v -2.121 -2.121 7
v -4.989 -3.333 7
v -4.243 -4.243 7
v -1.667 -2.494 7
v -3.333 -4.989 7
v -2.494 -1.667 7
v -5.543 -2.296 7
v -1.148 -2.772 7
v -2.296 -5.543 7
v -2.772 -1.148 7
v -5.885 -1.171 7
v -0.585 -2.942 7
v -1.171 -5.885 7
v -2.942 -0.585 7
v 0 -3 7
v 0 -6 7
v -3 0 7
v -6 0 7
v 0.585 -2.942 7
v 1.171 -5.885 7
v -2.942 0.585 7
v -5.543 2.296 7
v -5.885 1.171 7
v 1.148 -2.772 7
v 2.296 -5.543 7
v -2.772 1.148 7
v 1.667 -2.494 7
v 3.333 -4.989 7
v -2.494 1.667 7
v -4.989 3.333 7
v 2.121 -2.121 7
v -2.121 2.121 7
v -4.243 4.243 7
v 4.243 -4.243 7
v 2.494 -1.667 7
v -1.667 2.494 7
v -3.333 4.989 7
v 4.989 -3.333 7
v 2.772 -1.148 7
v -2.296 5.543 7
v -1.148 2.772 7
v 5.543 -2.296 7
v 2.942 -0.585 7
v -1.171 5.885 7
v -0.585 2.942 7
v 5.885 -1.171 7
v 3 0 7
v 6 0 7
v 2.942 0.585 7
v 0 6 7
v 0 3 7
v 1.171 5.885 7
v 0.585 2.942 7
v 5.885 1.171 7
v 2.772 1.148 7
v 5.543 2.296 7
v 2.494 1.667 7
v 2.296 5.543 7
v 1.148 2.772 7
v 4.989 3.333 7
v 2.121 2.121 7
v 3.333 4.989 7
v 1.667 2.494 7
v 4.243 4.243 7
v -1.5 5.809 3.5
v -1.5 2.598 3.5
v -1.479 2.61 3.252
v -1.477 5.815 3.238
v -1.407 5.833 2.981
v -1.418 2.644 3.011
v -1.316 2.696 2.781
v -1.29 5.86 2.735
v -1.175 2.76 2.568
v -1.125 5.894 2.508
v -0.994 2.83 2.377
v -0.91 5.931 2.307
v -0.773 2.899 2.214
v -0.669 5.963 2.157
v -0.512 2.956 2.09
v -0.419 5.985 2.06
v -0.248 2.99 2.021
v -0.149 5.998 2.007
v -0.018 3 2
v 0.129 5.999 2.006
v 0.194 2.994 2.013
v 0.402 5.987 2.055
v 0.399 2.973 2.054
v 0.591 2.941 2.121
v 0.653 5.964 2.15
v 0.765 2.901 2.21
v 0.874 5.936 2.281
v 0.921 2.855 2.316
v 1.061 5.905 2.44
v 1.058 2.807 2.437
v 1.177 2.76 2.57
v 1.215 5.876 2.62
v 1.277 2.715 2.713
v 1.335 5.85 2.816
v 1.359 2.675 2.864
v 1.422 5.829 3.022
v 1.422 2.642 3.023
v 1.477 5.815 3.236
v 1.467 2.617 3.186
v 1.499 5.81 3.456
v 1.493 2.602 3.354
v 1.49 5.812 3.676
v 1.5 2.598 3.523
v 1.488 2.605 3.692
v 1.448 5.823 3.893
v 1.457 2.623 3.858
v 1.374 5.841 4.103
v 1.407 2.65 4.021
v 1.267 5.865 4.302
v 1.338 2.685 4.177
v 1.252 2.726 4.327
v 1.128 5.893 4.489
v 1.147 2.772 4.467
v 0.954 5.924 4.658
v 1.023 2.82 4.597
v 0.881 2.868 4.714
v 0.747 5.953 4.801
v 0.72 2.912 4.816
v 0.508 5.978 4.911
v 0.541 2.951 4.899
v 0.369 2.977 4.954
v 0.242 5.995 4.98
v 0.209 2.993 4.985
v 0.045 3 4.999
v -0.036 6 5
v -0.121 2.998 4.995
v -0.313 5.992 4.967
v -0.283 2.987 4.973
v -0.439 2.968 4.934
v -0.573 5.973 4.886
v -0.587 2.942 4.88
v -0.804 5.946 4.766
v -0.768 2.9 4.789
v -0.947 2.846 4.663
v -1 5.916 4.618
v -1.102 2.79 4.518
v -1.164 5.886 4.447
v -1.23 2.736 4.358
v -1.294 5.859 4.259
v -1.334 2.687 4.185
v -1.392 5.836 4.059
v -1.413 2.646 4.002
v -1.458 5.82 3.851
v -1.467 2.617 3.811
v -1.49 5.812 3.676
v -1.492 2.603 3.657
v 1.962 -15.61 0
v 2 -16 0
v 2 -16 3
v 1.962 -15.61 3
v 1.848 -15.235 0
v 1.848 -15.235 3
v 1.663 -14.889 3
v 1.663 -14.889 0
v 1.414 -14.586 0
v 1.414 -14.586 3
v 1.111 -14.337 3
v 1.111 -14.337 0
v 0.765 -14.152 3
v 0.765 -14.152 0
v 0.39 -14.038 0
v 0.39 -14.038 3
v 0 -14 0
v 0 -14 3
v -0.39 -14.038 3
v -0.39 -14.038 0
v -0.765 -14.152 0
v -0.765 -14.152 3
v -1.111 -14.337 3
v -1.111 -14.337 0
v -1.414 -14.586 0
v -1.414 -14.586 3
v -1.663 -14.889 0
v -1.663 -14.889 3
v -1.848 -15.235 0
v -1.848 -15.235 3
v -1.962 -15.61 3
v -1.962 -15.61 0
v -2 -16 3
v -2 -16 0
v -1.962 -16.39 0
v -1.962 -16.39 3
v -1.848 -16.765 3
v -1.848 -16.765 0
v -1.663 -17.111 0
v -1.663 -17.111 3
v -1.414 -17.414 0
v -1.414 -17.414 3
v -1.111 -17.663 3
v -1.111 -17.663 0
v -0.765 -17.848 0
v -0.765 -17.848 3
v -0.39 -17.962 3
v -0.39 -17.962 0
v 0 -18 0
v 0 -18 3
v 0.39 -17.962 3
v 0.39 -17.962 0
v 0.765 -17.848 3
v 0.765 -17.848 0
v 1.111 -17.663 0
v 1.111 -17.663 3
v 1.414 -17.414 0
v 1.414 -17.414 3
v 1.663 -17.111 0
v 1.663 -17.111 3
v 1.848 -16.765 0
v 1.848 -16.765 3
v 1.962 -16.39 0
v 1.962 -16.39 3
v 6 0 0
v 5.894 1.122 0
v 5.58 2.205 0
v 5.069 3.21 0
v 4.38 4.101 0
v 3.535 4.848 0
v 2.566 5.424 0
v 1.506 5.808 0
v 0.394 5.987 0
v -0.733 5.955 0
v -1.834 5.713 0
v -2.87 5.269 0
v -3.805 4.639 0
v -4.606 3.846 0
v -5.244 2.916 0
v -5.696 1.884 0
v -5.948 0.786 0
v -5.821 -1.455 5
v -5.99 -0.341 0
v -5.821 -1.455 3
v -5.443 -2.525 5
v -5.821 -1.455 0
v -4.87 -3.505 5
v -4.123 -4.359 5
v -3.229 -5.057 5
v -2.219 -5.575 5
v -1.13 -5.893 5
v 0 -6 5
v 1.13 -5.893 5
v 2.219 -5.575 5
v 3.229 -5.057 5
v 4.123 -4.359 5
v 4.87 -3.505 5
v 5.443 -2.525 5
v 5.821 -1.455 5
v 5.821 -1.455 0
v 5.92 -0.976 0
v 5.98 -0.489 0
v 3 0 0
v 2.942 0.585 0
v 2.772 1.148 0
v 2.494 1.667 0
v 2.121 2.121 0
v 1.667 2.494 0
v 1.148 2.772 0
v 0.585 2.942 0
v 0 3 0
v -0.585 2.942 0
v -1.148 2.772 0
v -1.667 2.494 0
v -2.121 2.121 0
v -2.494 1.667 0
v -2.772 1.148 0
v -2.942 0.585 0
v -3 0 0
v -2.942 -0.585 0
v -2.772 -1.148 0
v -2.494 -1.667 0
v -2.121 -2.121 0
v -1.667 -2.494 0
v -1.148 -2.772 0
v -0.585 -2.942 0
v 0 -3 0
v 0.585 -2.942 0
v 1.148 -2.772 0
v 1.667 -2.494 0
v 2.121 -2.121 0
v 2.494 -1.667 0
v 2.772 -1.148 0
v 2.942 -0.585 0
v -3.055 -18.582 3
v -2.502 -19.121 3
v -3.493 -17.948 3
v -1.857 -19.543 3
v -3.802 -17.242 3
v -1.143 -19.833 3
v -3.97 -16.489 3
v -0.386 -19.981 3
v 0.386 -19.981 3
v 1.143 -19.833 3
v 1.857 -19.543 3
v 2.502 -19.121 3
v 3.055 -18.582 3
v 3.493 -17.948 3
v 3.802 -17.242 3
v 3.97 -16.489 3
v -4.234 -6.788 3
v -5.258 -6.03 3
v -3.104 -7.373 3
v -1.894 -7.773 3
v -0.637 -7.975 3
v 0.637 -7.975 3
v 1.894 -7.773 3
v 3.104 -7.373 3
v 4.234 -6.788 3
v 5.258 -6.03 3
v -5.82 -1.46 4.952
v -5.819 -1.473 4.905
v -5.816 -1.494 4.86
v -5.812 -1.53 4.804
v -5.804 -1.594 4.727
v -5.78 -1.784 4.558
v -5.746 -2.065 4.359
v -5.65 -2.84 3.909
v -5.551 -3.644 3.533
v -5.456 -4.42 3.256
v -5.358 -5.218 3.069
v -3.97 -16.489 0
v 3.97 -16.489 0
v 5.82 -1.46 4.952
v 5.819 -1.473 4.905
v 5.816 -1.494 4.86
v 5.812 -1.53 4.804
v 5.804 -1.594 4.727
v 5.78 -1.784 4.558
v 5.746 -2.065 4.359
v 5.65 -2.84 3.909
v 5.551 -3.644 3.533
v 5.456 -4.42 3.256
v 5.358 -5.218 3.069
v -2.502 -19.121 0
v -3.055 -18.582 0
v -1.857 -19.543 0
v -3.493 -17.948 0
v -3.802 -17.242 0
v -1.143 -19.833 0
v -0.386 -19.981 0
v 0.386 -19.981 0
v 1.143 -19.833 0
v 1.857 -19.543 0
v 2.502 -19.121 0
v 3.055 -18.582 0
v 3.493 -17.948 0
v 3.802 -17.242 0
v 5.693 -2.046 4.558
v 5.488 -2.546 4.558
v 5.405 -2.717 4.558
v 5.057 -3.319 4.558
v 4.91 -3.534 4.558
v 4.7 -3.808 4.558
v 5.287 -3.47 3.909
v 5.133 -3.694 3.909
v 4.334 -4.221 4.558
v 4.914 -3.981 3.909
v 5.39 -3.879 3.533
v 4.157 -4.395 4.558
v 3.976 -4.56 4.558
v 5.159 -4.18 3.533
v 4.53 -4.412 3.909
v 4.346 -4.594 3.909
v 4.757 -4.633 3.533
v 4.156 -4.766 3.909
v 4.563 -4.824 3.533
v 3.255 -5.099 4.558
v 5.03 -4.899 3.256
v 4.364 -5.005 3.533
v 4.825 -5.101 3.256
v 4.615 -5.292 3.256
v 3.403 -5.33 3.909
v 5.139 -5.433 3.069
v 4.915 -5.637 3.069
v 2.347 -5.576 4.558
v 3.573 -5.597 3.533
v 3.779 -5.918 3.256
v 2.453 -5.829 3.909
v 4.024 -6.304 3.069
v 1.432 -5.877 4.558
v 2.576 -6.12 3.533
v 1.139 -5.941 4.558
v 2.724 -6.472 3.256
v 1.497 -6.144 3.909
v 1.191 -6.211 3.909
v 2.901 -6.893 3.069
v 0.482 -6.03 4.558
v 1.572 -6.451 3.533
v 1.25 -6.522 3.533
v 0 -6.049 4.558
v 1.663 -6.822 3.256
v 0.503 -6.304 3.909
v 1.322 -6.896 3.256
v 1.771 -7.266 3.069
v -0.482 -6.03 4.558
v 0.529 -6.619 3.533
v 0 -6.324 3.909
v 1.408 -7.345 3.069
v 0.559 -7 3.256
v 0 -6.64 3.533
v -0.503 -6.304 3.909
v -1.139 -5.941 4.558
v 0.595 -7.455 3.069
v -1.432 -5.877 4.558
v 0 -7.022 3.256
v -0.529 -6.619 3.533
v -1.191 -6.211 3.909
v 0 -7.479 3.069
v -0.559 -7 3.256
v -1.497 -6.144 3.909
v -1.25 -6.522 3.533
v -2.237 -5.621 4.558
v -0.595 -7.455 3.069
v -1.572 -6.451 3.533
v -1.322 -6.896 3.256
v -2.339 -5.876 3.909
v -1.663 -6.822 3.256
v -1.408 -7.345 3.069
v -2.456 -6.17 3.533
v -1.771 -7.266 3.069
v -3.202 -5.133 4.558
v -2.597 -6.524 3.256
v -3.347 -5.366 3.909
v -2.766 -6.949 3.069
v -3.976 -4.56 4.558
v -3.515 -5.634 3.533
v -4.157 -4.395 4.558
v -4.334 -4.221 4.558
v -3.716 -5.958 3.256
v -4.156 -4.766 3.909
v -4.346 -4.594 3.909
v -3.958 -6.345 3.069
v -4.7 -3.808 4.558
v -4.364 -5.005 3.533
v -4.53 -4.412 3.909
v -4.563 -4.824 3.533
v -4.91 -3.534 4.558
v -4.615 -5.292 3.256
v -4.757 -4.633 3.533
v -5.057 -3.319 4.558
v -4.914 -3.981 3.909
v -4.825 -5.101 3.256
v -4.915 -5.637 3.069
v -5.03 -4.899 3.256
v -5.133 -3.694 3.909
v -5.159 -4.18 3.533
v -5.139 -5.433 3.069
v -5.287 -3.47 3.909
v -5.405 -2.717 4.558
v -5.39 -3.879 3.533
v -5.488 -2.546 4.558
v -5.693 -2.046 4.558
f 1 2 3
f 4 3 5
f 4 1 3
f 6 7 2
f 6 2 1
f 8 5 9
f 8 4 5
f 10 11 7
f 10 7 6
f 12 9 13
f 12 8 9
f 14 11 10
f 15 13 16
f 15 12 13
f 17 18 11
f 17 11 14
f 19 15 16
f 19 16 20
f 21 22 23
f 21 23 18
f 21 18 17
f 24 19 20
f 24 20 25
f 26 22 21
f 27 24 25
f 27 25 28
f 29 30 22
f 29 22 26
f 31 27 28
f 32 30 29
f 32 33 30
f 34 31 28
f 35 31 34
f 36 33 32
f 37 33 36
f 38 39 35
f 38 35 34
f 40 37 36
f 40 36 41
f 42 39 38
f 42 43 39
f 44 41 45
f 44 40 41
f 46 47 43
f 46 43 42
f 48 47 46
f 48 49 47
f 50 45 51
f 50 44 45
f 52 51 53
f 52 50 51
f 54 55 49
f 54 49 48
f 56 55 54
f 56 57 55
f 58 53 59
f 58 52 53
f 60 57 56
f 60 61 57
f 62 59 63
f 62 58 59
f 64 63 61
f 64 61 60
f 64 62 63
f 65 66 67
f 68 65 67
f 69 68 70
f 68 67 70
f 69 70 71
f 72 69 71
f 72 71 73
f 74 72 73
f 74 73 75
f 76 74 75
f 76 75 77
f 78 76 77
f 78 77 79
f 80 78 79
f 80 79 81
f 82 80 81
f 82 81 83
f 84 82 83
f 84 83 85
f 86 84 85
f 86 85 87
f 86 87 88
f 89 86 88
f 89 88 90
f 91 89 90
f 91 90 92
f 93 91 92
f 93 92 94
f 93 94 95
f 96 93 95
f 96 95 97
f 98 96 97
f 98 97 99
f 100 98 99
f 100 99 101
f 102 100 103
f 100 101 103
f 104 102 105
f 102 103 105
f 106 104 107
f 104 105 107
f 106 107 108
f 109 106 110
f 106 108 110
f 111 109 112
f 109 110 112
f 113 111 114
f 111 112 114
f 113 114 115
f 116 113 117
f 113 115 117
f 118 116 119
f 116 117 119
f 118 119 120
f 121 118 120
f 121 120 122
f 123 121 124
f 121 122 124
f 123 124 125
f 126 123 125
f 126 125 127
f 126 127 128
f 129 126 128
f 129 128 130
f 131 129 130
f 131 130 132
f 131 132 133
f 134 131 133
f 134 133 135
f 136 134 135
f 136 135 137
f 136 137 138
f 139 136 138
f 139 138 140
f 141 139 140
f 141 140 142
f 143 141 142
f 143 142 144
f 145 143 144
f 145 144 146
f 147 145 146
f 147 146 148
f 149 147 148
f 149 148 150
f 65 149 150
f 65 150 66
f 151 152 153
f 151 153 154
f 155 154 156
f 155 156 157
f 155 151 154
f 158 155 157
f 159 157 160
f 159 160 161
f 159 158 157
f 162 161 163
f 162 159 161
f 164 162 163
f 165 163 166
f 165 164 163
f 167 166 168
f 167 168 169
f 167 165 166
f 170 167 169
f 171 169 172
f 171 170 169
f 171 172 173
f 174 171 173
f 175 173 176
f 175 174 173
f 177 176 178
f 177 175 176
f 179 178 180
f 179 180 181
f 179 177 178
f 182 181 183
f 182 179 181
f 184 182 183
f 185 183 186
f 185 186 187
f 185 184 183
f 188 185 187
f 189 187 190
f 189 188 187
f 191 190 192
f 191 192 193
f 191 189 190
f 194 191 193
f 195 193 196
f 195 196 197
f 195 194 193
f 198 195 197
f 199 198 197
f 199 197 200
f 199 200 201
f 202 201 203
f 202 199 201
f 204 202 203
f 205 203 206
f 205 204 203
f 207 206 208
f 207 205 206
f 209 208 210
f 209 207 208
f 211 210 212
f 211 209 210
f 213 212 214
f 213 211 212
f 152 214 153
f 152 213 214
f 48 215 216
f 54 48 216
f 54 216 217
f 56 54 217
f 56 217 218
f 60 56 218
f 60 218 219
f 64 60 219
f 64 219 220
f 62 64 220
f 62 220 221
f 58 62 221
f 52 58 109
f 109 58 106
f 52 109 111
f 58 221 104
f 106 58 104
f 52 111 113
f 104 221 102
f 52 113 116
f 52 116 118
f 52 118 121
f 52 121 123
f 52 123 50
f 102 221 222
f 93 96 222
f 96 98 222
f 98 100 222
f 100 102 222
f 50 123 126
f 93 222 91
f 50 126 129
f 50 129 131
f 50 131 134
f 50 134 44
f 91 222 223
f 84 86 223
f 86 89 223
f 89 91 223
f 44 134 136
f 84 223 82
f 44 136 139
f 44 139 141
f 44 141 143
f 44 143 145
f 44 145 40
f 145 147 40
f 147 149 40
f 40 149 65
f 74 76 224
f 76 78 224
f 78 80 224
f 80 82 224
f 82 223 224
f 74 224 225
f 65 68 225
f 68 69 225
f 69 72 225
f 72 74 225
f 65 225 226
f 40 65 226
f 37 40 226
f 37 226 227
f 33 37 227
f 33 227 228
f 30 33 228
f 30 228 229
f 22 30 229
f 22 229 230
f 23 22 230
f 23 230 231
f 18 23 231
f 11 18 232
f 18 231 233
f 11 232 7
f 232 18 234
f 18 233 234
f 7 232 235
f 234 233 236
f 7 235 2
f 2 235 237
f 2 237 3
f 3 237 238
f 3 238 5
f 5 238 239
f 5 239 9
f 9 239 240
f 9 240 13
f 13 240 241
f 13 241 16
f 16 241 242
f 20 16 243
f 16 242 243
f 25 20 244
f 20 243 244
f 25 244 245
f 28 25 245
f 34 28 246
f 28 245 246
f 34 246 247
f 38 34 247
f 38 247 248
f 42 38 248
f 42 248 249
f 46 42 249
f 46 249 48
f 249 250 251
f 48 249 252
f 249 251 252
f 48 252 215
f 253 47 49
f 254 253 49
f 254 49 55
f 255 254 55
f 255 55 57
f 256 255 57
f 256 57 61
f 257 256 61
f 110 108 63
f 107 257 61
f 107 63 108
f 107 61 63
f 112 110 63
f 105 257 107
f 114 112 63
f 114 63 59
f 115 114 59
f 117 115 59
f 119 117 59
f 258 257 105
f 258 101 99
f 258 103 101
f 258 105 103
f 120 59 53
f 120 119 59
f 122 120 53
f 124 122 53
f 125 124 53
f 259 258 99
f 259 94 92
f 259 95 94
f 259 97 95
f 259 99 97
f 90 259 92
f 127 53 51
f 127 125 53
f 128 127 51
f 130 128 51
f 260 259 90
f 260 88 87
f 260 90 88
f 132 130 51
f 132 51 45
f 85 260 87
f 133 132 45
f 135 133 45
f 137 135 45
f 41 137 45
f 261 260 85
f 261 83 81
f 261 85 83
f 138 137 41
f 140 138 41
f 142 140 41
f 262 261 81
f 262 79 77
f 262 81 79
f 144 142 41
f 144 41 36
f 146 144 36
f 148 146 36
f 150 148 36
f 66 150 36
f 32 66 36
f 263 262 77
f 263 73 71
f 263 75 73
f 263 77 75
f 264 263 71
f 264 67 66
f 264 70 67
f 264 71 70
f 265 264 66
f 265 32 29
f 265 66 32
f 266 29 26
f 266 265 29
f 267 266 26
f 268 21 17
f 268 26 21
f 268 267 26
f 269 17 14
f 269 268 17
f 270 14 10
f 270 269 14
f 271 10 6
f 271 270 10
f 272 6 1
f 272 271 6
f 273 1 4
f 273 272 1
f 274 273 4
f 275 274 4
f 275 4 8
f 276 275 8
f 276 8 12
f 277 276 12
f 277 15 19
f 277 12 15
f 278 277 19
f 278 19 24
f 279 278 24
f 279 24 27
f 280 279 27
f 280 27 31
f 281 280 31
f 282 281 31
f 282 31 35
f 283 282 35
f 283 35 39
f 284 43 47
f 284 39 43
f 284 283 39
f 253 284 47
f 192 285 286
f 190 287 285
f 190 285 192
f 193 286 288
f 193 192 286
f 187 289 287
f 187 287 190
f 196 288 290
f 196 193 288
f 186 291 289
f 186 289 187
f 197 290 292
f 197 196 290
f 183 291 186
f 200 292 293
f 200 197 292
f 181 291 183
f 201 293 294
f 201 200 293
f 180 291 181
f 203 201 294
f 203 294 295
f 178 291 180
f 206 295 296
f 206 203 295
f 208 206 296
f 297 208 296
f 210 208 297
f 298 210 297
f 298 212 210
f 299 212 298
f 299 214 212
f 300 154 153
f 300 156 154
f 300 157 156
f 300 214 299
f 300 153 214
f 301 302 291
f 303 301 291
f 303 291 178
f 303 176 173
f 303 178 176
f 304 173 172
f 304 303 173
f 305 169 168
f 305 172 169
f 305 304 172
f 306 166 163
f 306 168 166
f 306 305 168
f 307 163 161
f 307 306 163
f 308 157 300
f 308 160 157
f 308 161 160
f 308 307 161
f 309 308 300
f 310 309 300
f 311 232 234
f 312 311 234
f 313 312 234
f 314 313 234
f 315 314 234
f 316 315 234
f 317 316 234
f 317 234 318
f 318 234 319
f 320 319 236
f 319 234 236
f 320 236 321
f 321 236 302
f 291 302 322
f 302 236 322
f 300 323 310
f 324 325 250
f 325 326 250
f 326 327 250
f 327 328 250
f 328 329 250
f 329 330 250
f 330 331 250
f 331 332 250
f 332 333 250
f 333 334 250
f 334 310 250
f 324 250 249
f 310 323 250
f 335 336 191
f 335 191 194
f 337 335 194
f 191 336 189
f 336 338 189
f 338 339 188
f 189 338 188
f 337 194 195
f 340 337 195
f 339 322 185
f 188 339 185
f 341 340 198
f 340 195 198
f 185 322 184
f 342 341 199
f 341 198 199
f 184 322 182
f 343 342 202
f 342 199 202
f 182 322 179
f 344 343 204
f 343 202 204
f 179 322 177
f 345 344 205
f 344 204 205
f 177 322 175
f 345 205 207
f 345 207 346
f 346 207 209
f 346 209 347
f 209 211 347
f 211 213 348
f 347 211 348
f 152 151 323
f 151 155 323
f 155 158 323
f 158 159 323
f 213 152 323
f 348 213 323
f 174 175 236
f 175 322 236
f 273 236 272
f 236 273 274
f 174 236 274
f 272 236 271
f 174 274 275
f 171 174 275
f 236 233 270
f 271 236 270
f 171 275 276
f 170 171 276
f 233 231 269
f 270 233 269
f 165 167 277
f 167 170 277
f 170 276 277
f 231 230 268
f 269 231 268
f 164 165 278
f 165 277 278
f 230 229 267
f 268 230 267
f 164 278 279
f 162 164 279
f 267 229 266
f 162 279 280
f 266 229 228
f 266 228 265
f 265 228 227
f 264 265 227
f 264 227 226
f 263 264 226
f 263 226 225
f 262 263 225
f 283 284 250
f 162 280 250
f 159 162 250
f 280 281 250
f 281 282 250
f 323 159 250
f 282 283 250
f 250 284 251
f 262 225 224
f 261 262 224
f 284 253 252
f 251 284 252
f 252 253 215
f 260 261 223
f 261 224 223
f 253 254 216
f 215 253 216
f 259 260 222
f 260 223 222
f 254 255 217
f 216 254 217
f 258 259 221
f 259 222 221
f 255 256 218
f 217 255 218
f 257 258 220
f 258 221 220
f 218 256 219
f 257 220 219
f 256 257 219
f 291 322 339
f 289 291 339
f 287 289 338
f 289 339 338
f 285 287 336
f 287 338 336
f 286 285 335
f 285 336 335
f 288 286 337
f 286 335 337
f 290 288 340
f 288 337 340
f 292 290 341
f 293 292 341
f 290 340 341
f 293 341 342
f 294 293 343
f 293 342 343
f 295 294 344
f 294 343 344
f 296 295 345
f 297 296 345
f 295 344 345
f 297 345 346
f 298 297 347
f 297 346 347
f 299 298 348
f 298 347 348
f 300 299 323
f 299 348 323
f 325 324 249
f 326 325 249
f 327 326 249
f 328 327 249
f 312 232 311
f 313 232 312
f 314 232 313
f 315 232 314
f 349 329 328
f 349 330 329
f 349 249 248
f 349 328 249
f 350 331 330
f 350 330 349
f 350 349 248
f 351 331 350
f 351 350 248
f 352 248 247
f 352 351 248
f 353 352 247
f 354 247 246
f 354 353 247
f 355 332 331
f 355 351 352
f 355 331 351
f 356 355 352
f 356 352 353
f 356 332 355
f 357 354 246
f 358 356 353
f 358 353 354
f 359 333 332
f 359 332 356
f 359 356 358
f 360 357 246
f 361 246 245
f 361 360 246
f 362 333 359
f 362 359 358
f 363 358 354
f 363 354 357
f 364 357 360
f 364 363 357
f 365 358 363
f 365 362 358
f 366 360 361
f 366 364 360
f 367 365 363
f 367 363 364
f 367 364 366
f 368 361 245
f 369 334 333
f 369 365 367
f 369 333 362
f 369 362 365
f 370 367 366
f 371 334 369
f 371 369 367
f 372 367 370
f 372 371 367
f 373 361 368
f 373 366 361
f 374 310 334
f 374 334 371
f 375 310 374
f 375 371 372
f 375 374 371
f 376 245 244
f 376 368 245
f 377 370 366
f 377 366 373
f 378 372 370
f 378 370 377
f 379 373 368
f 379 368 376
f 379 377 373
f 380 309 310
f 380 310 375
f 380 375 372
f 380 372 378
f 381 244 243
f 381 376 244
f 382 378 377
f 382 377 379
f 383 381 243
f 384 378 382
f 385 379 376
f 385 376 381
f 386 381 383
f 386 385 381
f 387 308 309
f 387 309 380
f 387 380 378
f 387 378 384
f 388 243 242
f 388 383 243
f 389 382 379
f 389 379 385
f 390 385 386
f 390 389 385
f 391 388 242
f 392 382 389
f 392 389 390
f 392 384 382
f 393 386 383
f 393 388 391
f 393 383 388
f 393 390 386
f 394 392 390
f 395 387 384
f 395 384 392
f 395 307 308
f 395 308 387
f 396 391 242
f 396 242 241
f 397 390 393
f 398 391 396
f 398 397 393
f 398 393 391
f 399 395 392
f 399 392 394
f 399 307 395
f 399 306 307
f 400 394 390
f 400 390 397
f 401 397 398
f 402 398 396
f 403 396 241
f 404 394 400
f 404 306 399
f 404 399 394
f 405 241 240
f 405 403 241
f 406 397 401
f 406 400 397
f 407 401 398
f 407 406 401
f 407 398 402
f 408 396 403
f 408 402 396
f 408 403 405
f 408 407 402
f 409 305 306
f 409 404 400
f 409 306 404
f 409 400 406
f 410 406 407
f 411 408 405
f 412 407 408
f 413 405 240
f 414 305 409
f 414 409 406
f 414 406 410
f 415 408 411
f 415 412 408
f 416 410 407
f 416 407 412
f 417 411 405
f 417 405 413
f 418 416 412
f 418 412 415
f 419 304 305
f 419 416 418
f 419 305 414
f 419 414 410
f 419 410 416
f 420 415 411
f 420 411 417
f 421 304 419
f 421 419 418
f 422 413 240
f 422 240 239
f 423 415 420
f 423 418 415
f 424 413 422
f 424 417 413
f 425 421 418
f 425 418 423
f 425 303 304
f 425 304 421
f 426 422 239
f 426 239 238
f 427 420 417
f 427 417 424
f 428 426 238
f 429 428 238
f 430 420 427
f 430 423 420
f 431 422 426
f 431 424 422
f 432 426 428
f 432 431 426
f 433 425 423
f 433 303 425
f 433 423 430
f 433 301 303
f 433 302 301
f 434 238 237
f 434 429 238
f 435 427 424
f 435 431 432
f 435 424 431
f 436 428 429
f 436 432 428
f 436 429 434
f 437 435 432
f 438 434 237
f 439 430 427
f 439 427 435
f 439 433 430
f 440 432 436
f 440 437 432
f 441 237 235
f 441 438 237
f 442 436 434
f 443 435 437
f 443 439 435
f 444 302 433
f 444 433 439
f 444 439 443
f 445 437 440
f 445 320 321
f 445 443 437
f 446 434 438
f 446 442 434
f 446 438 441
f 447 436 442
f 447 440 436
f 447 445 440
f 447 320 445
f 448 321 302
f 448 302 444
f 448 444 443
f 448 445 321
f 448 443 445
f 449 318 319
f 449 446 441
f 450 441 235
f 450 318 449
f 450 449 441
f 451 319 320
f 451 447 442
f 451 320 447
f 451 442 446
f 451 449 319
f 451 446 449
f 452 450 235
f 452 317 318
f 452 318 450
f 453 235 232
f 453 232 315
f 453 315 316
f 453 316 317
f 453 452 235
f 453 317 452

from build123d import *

# Parameters (mm, degrees)
SKETCH1_R             = 6
BOSS_EXTRUDE2_DEPTH   = 7
SKETCH1_4_R           = 2
BOSS_EXTRUDE3_DEPTH   = 3
SKETCH1_5_R           = 3
CUT_EXTRUDE1_DEPTH    = 8
FILLET5_R             = 2
M3_TAPPED_HOLE2_D     = 3
M3_TAPPED_HOLE2_DEPTH = 8.5
M3_TAPPED_HOLE2_TIP   = 0.901290929


with BuildPart() as part:
    # Sketch1 → Boss-Extrude2 (new body)
    with BuildSketch(Plane.XY):
        Circle(SKETCH1_R)
    extrude(amount=BOSS_EXTRUDE2_DEPTH)

    # Sketch1<4> → Boss-Extrude3 (add)
    with BuildSketch(Plane.XY):
        with BuildLine():
            Line((3.970026899, -16.488760087), (5.820835183, -1.45529302))
            ThreePointArc((5.820835183, -1.45529302), (0, -6), (-5.820835183, -1.45529302))
            Line((-5.820835183, -1.45529302), (-3.970026899, -16.488760087))
            ThreePointArc((-3.970026899, -16.488760087), (0, -20), (3.970026899, -16.488760087))
        make_face()
        with Locations((0, -16)):
            Circle(SKETCH1_4_R, mode=Mode.SUBTRACT)
    extrude(amount=BOSS_EXTRUDE3_DEPTH)

    # Sketch1<5> → Cut-Extrude1 (cut, through all)
    with BuildSketch(Plane.XY):
        Circle(SKETCH1_5_R)
    extrude(amount=CUT_EXTRUDE1_DEPTH, mode=Mode.SUBTRACT)

    # Fillet5
    fillet5_edges = [part.edges().sort_by_distance(p)[0] for p in [
        (0, -6, 3),
    ]]
    fillet(fillet5_edges, radius=FILLET5_R)

    # M3 Tapped Hole2
    with Locations(Plane(origin=(0, 7, 0), x_dir=(1, 0, 0), z_dir=(0, 1, 0))):
        with Locations((0, -3.5)):
            Hole(M3_TAPPED_HOLE2_D / 2, depth=M3_TAPPED_HOLE2_DEPTH)
            with Locations((0, 0, -(M3_TAPPED_HOLE2_DEPTH + M3_TAPPED_HOLE2_TIP / 2))):  # 118° drill point
                Cone(0, M3_TAPPED_HOLE2_D / 2, M3_TAPPED_HOLE2_TIP, mode=Mode.SUBTRACT)


solid = part.part
